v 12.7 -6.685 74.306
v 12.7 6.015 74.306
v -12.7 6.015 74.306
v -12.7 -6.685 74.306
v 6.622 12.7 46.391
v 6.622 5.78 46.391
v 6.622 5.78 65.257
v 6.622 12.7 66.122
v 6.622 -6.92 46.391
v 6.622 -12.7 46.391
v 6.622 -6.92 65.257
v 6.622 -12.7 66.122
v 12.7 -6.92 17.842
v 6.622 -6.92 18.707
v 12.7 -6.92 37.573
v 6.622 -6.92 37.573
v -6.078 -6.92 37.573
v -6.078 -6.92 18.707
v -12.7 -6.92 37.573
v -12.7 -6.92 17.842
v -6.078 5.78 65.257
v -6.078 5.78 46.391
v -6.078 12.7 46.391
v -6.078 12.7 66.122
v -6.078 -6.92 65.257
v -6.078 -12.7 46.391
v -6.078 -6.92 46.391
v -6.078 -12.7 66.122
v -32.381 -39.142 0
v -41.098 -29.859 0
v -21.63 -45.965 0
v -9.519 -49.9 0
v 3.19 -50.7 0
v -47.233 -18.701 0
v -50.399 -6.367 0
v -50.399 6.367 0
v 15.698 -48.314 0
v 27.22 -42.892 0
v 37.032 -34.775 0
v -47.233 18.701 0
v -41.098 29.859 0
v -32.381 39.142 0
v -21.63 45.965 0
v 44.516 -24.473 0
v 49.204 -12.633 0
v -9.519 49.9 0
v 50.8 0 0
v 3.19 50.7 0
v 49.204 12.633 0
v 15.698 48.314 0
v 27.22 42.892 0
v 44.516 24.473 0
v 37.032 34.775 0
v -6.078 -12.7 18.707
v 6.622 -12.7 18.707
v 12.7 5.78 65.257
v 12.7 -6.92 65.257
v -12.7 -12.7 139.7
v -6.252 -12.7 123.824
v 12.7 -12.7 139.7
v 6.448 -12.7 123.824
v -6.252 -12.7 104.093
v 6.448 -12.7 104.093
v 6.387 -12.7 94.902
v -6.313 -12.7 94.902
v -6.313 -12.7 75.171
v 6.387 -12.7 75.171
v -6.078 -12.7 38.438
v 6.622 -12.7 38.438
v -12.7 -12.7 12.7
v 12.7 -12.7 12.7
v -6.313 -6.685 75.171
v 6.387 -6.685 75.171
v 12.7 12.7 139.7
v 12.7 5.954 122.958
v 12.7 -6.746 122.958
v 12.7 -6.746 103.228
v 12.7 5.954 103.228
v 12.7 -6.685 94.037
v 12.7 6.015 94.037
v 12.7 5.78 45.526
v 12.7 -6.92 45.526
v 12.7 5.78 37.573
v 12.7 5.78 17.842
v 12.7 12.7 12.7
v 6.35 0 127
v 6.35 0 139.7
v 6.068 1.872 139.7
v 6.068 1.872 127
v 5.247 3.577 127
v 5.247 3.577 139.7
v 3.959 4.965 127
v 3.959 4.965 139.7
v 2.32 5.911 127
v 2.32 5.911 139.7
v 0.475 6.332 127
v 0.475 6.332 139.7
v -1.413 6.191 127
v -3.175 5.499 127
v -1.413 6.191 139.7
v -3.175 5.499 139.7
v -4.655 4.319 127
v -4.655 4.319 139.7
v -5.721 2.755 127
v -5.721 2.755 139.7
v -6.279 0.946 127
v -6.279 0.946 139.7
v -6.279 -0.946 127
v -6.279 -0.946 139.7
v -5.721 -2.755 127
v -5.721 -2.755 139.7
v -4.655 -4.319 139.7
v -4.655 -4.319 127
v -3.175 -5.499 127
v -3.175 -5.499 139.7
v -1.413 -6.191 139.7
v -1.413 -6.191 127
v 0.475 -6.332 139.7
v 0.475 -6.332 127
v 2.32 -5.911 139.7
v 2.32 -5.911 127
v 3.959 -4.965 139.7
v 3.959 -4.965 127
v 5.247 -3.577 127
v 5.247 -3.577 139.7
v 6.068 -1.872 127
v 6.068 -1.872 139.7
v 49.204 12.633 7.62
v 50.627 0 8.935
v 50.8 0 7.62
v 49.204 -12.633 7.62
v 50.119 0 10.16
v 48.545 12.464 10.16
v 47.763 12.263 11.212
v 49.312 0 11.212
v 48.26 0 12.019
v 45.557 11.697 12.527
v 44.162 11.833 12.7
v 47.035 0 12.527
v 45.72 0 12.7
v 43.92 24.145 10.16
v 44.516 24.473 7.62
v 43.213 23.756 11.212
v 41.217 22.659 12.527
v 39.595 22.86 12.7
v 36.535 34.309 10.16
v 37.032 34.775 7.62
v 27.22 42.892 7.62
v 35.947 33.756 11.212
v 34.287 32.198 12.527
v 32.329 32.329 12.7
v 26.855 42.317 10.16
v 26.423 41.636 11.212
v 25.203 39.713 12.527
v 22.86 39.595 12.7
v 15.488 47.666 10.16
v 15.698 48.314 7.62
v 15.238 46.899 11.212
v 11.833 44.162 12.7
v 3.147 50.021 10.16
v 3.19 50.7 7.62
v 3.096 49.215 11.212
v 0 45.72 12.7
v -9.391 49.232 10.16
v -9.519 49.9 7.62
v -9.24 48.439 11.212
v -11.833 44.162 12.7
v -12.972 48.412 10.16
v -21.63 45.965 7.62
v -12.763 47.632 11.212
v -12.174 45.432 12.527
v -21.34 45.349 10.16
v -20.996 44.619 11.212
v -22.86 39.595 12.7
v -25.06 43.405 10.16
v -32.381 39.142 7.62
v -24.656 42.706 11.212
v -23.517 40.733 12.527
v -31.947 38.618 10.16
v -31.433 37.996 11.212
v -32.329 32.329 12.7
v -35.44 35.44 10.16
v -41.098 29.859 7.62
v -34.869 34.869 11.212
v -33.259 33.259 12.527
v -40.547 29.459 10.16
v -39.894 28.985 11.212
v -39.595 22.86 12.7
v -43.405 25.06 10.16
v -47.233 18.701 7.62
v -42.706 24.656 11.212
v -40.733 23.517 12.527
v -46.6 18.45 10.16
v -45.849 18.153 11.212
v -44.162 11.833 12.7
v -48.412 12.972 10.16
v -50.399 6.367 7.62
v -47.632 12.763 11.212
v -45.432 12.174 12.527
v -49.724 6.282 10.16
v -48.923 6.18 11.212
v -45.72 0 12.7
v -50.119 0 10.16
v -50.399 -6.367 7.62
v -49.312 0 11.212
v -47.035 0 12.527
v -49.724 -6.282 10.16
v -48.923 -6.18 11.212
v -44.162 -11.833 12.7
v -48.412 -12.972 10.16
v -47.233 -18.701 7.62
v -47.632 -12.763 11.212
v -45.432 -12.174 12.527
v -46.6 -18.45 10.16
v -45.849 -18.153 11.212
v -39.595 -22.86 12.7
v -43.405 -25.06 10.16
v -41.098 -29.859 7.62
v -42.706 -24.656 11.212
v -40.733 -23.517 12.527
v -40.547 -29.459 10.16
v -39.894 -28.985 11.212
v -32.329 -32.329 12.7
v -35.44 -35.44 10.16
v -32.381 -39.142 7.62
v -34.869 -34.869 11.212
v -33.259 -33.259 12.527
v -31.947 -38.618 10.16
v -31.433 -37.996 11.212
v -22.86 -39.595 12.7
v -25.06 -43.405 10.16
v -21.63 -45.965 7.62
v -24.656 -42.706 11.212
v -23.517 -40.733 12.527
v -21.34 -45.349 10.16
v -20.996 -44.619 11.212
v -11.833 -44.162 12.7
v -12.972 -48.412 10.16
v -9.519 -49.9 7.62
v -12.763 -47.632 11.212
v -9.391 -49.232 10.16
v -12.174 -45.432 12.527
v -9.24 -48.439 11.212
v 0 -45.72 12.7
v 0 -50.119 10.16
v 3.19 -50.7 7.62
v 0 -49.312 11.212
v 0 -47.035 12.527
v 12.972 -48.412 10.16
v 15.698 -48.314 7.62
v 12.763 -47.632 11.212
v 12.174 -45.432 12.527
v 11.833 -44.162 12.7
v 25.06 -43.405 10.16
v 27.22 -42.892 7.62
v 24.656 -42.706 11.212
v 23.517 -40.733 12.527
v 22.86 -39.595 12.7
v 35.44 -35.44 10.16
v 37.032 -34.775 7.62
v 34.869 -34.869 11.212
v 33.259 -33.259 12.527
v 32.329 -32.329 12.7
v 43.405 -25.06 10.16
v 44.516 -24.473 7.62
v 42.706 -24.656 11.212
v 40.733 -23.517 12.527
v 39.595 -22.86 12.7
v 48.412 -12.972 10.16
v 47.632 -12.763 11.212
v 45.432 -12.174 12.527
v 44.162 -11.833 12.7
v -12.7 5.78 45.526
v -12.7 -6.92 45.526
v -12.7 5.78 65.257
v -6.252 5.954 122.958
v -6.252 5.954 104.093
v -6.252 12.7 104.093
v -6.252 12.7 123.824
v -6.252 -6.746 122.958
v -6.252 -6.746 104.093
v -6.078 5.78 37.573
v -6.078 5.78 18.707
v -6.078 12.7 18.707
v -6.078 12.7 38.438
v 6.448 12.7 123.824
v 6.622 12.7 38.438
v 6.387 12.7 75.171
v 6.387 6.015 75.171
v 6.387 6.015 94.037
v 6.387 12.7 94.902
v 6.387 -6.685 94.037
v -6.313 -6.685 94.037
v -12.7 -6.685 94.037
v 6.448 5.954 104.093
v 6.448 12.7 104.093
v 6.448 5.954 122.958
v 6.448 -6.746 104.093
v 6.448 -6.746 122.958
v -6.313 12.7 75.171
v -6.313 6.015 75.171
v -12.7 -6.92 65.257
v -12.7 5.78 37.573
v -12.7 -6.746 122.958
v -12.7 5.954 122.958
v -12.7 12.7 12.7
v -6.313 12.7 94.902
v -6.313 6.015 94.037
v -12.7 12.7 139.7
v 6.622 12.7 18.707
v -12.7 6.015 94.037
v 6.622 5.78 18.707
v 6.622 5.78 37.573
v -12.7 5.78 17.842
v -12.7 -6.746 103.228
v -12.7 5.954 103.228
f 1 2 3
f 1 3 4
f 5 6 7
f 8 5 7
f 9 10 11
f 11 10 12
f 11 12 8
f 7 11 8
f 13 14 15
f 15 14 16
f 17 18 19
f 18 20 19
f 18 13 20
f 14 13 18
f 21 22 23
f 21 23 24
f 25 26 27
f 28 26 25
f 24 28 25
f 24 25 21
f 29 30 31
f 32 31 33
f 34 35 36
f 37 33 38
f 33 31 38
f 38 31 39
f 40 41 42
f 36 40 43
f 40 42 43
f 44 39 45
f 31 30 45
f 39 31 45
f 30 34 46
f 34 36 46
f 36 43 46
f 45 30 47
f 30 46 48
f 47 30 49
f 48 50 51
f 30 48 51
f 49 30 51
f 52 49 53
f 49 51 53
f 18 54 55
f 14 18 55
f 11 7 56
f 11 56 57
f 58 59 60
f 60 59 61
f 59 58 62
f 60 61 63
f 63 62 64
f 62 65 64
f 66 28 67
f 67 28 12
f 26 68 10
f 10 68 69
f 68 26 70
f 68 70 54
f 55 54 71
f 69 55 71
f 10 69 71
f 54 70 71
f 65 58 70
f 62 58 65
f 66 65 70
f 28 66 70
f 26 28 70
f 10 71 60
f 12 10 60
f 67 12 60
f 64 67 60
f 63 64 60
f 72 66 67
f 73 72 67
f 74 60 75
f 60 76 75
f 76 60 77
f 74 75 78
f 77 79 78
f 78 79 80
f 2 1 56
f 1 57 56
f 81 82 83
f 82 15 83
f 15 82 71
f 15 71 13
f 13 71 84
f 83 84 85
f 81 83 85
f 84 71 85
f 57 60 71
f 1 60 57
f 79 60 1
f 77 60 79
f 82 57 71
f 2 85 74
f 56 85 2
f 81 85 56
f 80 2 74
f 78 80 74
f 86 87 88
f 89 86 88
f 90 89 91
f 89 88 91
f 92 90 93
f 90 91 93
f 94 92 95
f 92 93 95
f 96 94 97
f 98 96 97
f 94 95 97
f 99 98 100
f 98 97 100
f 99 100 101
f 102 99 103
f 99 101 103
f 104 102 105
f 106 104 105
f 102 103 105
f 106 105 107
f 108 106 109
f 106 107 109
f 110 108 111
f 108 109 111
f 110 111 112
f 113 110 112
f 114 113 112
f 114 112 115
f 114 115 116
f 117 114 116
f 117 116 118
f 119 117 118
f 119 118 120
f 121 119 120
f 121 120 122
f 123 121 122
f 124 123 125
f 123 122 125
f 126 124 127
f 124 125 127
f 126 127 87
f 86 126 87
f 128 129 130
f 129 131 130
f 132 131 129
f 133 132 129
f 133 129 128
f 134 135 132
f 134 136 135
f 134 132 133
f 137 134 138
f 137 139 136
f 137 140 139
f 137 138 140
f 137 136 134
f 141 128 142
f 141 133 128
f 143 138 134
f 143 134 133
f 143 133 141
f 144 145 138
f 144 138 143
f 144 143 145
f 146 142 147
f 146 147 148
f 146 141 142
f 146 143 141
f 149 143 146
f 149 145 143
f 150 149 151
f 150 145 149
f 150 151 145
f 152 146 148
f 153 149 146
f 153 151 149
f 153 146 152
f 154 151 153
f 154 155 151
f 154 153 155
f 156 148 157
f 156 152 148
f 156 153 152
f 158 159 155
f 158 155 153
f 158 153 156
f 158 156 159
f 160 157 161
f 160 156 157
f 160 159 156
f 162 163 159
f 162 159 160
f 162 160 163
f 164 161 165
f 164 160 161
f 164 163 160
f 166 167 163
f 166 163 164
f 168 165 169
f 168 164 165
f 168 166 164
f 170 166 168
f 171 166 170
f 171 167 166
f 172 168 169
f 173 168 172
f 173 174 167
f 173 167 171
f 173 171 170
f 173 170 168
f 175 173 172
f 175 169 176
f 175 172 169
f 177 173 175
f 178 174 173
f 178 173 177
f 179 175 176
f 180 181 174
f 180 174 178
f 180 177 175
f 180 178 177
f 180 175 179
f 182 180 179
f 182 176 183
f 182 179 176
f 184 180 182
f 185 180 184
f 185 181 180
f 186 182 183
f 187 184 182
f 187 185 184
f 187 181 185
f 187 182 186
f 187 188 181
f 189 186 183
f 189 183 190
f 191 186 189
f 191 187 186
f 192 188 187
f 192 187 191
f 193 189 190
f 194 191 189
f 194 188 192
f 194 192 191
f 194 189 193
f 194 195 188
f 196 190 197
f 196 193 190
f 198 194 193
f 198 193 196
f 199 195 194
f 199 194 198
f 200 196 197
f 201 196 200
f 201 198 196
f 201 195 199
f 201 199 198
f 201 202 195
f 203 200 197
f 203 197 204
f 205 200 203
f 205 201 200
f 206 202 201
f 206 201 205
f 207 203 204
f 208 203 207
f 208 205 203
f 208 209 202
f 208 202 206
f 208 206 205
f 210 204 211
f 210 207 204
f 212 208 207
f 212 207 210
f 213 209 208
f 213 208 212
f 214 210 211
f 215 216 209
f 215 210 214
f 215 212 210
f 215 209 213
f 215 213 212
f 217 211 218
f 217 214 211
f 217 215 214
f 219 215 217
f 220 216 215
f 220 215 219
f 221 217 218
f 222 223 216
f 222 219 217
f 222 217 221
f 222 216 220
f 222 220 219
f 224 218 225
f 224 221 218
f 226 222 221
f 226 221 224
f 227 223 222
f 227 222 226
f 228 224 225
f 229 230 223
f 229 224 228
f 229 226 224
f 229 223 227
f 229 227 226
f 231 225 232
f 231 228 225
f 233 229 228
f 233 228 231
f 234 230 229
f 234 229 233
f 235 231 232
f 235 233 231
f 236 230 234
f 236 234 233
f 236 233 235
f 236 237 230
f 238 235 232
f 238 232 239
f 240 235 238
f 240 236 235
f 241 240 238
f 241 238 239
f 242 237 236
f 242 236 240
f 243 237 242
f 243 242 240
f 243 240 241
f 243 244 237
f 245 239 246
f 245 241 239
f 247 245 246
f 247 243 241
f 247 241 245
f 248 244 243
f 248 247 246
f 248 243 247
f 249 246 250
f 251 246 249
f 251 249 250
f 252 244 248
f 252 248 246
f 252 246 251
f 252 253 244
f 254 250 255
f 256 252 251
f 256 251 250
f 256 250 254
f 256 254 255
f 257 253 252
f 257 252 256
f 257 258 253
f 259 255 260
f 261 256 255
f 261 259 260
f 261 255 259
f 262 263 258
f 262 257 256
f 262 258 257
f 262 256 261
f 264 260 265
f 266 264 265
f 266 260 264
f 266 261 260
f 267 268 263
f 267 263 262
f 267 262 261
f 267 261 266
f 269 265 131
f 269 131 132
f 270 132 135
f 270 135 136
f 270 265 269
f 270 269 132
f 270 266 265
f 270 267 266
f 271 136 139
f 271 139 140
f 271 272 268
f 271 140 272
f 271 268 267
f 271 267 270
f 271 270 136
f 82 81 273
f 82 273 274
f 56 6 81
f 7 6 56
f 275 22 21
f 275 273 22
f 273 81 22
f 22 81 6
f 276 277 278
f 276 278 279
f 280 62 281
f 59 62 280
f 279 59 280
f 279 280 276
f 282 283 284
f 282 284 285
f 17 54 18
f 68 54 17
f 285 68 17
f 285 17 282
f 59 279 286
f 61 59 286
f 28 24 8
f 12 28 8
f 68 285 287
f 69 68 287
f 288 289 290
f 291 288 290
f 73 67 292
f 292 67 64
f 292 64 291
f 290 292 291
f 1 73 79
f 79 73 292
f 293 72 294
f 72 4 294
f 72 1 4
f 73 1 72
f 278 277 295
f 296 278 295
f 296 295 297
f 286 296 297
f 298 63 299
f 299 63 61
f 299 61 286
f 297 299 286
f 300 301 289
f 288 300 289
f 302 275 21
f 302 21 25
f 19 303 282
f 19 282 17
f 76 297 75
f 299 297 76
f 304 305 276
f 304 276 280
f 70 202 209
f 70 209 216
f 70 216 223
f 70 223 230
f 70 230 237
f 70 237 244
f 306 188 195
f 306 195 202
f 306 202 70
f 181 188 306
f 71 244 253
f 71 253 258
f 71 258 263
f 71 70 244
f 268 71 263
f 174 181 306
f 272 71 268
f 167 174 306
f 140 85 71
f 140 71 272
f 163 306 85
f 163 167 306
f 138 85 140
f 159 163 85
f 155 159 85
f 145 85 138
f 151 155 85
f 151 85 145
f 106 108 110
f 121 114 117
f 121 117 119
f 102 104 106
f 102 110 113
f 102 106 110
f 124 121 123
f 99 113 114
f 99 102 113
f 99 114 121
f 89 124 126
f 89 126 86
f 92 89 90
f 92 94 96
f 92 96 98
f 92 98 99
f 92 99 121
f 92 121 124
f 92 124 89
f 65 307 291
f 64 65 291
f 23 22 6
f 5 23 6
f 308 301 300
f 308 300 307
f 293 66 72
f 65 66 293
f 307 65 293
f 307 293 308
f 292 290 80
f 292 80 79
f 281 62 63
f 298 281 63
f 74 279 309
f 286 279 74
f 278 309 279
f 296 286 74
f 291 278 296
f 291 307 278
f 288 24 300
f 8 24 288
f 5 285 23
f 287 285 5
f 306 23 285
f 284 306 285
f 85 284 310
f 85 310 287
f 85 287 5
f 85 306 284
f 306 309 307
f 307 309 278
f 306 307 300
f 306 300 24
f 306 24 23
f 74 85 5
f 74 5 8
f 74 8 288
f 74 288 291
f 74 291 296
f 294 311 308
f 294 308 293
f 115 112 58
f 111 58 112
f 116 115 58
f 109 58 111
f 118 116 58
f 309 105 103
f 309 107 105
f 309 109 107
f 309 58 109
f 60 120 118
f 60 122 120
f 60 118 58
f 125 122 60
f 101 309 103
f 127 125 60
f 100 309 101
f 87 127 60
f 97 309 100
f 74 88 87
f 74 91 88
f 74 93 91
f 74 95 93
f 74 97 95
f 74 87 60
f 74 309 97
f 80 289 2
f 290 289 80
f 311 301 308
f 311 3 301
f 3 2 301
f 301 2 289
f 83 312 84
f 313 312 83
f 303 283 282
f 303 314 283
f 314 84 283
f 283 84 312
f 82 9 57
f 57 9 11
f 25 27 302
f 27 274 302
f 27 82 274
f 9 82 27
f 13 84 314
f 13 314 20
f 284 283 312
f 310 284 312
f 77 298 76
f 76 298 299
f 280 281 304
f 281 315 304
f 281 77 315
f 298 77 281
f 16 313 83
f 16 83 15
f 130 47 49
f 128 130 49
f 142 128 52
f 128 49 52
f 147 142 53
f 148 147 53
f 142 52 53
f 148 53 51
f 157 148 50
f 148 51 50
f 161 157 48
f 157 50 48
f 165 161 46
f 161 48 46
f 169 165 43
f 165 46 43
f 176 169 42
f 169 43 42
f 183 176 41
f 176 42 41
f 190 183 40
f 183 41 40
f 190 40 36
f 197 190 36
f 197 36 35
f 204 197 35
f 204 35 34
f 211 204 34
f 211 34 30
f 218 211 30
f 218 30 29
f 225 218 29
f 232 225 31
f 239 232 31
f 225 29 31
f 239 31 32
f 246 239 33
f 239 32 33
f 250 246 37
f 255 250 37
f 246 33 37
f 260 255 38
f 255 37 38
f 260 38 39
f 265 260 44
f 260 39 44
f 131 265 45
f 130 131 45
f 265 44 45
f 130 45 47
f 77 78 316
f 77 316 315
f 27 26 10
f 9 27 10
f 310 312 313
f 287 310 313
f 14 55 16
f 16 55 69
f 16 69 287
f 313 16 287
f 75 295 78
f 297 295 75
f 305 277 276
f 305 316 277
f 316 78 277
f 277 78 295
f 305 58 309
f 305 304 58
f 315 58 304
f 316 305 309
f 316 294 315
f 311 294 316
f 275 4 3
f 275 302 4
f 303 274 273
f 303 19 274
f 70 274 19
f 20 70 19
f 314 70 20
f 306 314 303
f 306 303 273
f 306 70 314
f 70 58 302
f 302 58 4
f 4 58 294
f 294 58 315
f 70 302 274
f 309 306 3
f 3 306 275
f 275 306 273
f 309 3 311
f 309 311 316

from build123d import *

# Parameters (mm, degrees)
F0_R     = 50.8
F1_DEPTH = 12.7
F2_W     = 25.4
F2_H     = 25.4
F3_DEPTH = 127
F4_W     = 12.7
F4_H     = 19.730706
F5_DEPTH = 25.4
F6_W     = 12.7
F6_H     = 19.730706
F7_DEPTH = 25.4
F8_R     = 6.35
F9_DEPTH = 12.7
F10_R    = 5.08


with BuildPart() as f1:
    # F0 (on Top) → F1 (new body)
    with BuildSketch(Plane.XY):
        Circle(F0_R)
    extrude(amount=F1_DEPTH)

    # F2 (on face) → F3 (join)
    with BuildSketch(Plane.XY.offset(12.7)):
        Rectangle(F2_W, F2_H)
    extrude(amount=F3_DEPTH)

    # F4 (on face) → F5 (cut)
    with BuildSketch(Plane.XZ.offset(12.7)):
        with Locations((0.098038, 113.95823)):
            Rectangle(F4_W, F4_H)
        with Locations((0.036561, 85.036777)):
            Rectangle(F4_W, F4_H)
        with Locations((0.27161, 56.256354)):
            Rectangle(F4_W, F4_H)
        with Locations((0.271611, 28.572757)):
            Rectangle(F4_W, F4_H)
    extrude(amount=-F5_DEPTH, mode=Mode.SUBTRACT)

    # F6 (on face) → F7 (cut)
    with BuildSketch(Plane(origin=(-12.7, 0, 0), x_dir=(0, -1, 0), z_dir=(-1, 0, 0))):
        with Locations((0.396478, 113.09307)):
            Rectangle(F6_W, F6_H)
        with Locations((0.335001, 84.171617)):
            Rectangle(F6_W, F6_H)
        with Locations((0.57005, 55.391194)):
            Rectangle(F6_W, F6_H)
        with Locations((0.570051, 27.707597)):
            Rectangle(F6_W, F6_H)
    extrude(amount=-F7_DEPTH, mode=Mode.SUBTRACT)

    # F8 (on face) → F9 (cut)
    with BuildSketch(Plane.XY.offset(139.7)):
        Circle(F8_R)
    extrude(amount=-F9_DEPTH, mode=Mode.SUBTRACT)

    # F10
    f10_edges = [f1.edges().sort_by_distance(p)[0] for p in [
        (-50.8, 0, 12.7),
    ]]
    fillet(f10_edges, radius=F10_R)


solid = f1.part
